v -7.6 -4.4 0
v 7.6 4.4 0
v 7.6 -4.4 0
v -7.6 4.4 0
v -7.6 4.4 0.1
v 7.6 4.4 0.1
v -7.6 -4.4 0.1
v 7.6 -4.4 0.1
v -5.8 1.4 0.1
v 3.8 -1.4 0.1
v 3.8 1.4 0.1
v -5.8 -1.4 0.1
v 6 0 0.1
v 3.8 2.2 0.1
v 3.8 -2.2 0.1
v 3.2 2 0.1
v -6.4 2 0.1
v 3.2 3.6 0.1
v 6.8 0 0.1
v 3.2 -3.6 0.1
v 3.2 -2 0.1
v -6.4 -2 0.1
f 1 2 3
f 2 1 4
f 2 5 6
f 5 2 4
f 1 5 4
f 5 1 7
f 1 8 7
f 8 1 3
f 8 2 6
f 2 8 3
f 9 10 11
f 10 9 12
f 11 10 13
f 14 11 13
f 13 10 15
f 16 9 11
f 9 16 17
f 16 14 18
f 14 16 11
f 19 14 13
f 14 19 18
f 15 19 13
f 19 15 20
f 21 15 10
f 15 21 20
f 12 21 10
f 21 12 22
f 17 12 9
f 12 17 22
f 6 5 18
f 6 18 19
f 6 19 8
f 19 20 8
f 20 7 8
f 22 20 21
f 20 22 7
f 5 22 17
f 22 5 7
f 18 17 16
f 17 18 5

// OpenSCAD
// file: ../p/box5-12.scad
use <../lib.scad>
function ldraw_lib__box5_12() = [
// 0 Box with 5 Faces without Any Edges
// 0 Name: box5-12.dat
// 0 Author: Chris Dee [cwdee]
// 0 !LDRAW_ORG Primitive UPDATE 2009-02
// 0 !LICENSE Licensed under CC BY 4.0 : see CAreadme.txt
// 
// 0 BFC CERTIFY CCW
  [0,"BFC","CERTIFY"],
  [0,"BFC","CCW"],
// 
// 0 !HISTORY 2009-09-03 [PTadmin] Official Update 2009-02
// 
// 
// 4 16 1 1 1 1 1 -1 -1 1 -1 -1 1 1
  [4,16,1,1,1,1,1,-1,-1,1,-1,-1,1,1],
// 4 16 -1 0 1 1 0 1 1 1 1 -1 1 1
  [4,16,-1,0,1,1,0,1,1,1,1,-1,1,1],
// 4 16 -1 0 -1 -1 0 1 -1 1 1 -1 1 -1
  [4,16,-1,0,-1,-1,0,1,-1,1,1,-1,1,-1],
// 4 16 1 0 -1 -1 0 -1 -1 1 -1 1 1 -1
  [4,16,1,0,-1,-1,0,-1,-1,1,-1,1,1,-1],
// 4 16 1 0 1 1 0 -1 1 1 -1 1 1 1
  [4,16,1,0,1,1,0,-1,1,1,-1,1,1,1],
// 0
];
module ldraw_lib__box5_12(step=0, col=false, unit=2/5, alt=false, line=0.2, solid=!$preview)
    makepoly(ldraw_lib__box5_12(), step=step, col=col, unit=unit, alt=alt, line=line, solid=solid);
ldraw_lib__box5_12(line=0.2);
// main file
use <../lib.scad>
use <../p/box5-12.scad>
function ldraw_lib__164525a() = [
// 0 Sticker  1.1 x  1.9 with Yellow Arrow on Light Grey Background
// 0 Name: 164525a.dat
// 0 Author: Takeshi Takahashi [RainbowDolphin]
// 0 !LDRAW_ORG Part UPDATE 2025-03
// 0 !LICENSE Licensed under CC BY 4.0 : see CAreadme.txt
// 
// 0 BFC CERTIFY CCW
  [0,"BFC","CERTIFY"],
  [0,"BFC","CCW"],
// 
// 0 !KEYWORDS helicopter, Set 8856, Technic, Whirlwind rescue
// 
// 0 !HISTORY 2025-03-30 [OrionP] Official Update 2025-03
// 
// 1 16 0 -0.25 0 19 0 0 0 0.25 0 0 0 11 box5-12.dat
  [1,16,0,-0.25,0,19,0,0,0,0.25,0,0,0,11, ldraw_lib__box5_12()],
// 4 14 9.5 -0.25 3.5 -14.5 -0.25 3.5 -14.5 -0.25 -3.5 9.5 -0.25 -3.5
  [4,14,9.5,-0.25,3.5,-14.5,-0.25,3.5,-14.5,-0.25,-3.5,9.5,-0.25,-3.5],
// 3 14 9.5 -0.25 3.5 9.5 -0.25 -3.5 15 -0.25 0
  [3,14,9.5,-0.25,3.5,9.5,-0.25,-3.5,15,-0.25,0],
// 3 14 9.5 -0.25 5.5 9.5 -0.25 3.5 15 -0.25 0
  [3,14,9.5,-0.25,5.5,9.5,-0.25,3.5,15,-0.25,0],
// 3 14 15 -0.25 0 9.5 -0.25 -3.5 9.5 -0.25 -5.5
  [3,14,15,-0.25,0,9.5,-0.25,-3.5,9.5,-0.25,-5.5],
// 4 0 8 -0.25 5 -16 -0.25 5 -14.5 -0.25 3.5 9.5 -0.25 3.5
  [4,0,8,-0.25,5,-16,-0.25,5,-14.5,-0.25,3.5,9.5,-0.25,3.5],
// 4 0 8 -0.25 5 9.5 -0.25 3.5 9.5 -0.25 5.5 8 -0.25 9
  [4,0,8,-0.25,5,9.5,-0.25,3.5,9.5,-0.25,5.5,8,-0.25,9],
// 4 0 17 -0.25 0 8 -0.25 9 9.5 -0.25 5.5 15 -0.25 0
  [4,0,17,-0.25,0,8,-0.25,9,9.5,-0.25,5.5,15,-0.25,0],
// 4 0 17 -0.25 0 15 -0.25 0 9.5 -0.25 -5.5 8 -0.25 -9
  [4,0,17,-0.25,0,15,-0.25,0,9.5,-0.25,-5.5,8,-0.25,-9],
// 4 0 8 -0.25 -5 8 -0.25 -9 9.5 -0.25 -5.5 9.5 -0.25 -3.5
  [4,0,8,-0.25,-5,8,-0.25,-9,9.5,-0.25,-5.5,9.5,-0.25,-3.5],
// 4 0 8 -0.25 -5 9.5 -0.25 -3.5 -14.5 -0.25 -3.5 -16 -0.25 -5
  [4,0,8,-0.25,-5,9.5,-0.25,-3.5,-14.5,-0.25,-3.5,-16,-0.25,-5],
// 4 0 -16 -0.25 5 -16 -0.25 -5 -14.5 -0.25 -3.5 -14.5 -0.25 3.5
  [4,0,-16,-0.25,5,-16,-0.25,-5,-14.5,-0.25,-3.5,-14.5,-0.25,3.5],
// 3 7 19 -0.25 11 -19 -0.25 11 8 -0.25 9
  [3,7,19,-0.25,11,-19,-0.25,11,8,-0.25,9],
// 3 7 19 -0.25 11 8 -0.25 9 17 -0.25 0
  [3,7,19,-0.25,11,8,-0.25,9,17,-0.25,0],
// 3 7 19 -0.25 11 17 -0.25 0 19 -0.25 -11
  [3,7,19,-0.25,11,17,-0.25,0,19,-0.25,-11],
// 3 7 17 -0.25 0 8 -0.25 -9 19 -0.25 -11
  [3,7,17,-0.25,0,8,-0.25,-9,19,-0.25,-11],
// 3 7 8 -0.25 -9 -19 -0.25 -11 19 -0.25 -11
  [3,7,8,-0.25,-9,-19,-0.25,-11,19,-0.25,-11],
// 4 7 -19 -0.25 -11 8 -0.25 -9 8 -0.25 -5 -16 -0.25 -5
  [4,7,-19,-0.25,-11,8,-0.25,-9,8,-0.25,-5,-16,-0.25,-5],
// 4 7 -19 -0.25 -11 -16 -0.25 -5 -16 -0.25 5 -19 -0.25 11
  [4,7,-19,-0.25,-11,-16,-0.25,-5,-16,-0.25,5,-19,-0.25,11],
// 4 7 -19 -0.25 11 -16 -0.25 5 8 -0.25 5 8 -0.25 9
  [4,7,-19,-0.25,11,-16,-0.25,5,8,-0.25,5,8,-0.25,9],
];
module ldraw_lib__164525a(step=0, col=false, unit=2/5, alt=false, line=0.2, solid=!$preview)
    makepoly(ldraw_lib__164525a(), step=step, col=col, unit=unit, alt=alt, line=line, solid=solid);
ldraw_lib__164525a(line=0.2);
